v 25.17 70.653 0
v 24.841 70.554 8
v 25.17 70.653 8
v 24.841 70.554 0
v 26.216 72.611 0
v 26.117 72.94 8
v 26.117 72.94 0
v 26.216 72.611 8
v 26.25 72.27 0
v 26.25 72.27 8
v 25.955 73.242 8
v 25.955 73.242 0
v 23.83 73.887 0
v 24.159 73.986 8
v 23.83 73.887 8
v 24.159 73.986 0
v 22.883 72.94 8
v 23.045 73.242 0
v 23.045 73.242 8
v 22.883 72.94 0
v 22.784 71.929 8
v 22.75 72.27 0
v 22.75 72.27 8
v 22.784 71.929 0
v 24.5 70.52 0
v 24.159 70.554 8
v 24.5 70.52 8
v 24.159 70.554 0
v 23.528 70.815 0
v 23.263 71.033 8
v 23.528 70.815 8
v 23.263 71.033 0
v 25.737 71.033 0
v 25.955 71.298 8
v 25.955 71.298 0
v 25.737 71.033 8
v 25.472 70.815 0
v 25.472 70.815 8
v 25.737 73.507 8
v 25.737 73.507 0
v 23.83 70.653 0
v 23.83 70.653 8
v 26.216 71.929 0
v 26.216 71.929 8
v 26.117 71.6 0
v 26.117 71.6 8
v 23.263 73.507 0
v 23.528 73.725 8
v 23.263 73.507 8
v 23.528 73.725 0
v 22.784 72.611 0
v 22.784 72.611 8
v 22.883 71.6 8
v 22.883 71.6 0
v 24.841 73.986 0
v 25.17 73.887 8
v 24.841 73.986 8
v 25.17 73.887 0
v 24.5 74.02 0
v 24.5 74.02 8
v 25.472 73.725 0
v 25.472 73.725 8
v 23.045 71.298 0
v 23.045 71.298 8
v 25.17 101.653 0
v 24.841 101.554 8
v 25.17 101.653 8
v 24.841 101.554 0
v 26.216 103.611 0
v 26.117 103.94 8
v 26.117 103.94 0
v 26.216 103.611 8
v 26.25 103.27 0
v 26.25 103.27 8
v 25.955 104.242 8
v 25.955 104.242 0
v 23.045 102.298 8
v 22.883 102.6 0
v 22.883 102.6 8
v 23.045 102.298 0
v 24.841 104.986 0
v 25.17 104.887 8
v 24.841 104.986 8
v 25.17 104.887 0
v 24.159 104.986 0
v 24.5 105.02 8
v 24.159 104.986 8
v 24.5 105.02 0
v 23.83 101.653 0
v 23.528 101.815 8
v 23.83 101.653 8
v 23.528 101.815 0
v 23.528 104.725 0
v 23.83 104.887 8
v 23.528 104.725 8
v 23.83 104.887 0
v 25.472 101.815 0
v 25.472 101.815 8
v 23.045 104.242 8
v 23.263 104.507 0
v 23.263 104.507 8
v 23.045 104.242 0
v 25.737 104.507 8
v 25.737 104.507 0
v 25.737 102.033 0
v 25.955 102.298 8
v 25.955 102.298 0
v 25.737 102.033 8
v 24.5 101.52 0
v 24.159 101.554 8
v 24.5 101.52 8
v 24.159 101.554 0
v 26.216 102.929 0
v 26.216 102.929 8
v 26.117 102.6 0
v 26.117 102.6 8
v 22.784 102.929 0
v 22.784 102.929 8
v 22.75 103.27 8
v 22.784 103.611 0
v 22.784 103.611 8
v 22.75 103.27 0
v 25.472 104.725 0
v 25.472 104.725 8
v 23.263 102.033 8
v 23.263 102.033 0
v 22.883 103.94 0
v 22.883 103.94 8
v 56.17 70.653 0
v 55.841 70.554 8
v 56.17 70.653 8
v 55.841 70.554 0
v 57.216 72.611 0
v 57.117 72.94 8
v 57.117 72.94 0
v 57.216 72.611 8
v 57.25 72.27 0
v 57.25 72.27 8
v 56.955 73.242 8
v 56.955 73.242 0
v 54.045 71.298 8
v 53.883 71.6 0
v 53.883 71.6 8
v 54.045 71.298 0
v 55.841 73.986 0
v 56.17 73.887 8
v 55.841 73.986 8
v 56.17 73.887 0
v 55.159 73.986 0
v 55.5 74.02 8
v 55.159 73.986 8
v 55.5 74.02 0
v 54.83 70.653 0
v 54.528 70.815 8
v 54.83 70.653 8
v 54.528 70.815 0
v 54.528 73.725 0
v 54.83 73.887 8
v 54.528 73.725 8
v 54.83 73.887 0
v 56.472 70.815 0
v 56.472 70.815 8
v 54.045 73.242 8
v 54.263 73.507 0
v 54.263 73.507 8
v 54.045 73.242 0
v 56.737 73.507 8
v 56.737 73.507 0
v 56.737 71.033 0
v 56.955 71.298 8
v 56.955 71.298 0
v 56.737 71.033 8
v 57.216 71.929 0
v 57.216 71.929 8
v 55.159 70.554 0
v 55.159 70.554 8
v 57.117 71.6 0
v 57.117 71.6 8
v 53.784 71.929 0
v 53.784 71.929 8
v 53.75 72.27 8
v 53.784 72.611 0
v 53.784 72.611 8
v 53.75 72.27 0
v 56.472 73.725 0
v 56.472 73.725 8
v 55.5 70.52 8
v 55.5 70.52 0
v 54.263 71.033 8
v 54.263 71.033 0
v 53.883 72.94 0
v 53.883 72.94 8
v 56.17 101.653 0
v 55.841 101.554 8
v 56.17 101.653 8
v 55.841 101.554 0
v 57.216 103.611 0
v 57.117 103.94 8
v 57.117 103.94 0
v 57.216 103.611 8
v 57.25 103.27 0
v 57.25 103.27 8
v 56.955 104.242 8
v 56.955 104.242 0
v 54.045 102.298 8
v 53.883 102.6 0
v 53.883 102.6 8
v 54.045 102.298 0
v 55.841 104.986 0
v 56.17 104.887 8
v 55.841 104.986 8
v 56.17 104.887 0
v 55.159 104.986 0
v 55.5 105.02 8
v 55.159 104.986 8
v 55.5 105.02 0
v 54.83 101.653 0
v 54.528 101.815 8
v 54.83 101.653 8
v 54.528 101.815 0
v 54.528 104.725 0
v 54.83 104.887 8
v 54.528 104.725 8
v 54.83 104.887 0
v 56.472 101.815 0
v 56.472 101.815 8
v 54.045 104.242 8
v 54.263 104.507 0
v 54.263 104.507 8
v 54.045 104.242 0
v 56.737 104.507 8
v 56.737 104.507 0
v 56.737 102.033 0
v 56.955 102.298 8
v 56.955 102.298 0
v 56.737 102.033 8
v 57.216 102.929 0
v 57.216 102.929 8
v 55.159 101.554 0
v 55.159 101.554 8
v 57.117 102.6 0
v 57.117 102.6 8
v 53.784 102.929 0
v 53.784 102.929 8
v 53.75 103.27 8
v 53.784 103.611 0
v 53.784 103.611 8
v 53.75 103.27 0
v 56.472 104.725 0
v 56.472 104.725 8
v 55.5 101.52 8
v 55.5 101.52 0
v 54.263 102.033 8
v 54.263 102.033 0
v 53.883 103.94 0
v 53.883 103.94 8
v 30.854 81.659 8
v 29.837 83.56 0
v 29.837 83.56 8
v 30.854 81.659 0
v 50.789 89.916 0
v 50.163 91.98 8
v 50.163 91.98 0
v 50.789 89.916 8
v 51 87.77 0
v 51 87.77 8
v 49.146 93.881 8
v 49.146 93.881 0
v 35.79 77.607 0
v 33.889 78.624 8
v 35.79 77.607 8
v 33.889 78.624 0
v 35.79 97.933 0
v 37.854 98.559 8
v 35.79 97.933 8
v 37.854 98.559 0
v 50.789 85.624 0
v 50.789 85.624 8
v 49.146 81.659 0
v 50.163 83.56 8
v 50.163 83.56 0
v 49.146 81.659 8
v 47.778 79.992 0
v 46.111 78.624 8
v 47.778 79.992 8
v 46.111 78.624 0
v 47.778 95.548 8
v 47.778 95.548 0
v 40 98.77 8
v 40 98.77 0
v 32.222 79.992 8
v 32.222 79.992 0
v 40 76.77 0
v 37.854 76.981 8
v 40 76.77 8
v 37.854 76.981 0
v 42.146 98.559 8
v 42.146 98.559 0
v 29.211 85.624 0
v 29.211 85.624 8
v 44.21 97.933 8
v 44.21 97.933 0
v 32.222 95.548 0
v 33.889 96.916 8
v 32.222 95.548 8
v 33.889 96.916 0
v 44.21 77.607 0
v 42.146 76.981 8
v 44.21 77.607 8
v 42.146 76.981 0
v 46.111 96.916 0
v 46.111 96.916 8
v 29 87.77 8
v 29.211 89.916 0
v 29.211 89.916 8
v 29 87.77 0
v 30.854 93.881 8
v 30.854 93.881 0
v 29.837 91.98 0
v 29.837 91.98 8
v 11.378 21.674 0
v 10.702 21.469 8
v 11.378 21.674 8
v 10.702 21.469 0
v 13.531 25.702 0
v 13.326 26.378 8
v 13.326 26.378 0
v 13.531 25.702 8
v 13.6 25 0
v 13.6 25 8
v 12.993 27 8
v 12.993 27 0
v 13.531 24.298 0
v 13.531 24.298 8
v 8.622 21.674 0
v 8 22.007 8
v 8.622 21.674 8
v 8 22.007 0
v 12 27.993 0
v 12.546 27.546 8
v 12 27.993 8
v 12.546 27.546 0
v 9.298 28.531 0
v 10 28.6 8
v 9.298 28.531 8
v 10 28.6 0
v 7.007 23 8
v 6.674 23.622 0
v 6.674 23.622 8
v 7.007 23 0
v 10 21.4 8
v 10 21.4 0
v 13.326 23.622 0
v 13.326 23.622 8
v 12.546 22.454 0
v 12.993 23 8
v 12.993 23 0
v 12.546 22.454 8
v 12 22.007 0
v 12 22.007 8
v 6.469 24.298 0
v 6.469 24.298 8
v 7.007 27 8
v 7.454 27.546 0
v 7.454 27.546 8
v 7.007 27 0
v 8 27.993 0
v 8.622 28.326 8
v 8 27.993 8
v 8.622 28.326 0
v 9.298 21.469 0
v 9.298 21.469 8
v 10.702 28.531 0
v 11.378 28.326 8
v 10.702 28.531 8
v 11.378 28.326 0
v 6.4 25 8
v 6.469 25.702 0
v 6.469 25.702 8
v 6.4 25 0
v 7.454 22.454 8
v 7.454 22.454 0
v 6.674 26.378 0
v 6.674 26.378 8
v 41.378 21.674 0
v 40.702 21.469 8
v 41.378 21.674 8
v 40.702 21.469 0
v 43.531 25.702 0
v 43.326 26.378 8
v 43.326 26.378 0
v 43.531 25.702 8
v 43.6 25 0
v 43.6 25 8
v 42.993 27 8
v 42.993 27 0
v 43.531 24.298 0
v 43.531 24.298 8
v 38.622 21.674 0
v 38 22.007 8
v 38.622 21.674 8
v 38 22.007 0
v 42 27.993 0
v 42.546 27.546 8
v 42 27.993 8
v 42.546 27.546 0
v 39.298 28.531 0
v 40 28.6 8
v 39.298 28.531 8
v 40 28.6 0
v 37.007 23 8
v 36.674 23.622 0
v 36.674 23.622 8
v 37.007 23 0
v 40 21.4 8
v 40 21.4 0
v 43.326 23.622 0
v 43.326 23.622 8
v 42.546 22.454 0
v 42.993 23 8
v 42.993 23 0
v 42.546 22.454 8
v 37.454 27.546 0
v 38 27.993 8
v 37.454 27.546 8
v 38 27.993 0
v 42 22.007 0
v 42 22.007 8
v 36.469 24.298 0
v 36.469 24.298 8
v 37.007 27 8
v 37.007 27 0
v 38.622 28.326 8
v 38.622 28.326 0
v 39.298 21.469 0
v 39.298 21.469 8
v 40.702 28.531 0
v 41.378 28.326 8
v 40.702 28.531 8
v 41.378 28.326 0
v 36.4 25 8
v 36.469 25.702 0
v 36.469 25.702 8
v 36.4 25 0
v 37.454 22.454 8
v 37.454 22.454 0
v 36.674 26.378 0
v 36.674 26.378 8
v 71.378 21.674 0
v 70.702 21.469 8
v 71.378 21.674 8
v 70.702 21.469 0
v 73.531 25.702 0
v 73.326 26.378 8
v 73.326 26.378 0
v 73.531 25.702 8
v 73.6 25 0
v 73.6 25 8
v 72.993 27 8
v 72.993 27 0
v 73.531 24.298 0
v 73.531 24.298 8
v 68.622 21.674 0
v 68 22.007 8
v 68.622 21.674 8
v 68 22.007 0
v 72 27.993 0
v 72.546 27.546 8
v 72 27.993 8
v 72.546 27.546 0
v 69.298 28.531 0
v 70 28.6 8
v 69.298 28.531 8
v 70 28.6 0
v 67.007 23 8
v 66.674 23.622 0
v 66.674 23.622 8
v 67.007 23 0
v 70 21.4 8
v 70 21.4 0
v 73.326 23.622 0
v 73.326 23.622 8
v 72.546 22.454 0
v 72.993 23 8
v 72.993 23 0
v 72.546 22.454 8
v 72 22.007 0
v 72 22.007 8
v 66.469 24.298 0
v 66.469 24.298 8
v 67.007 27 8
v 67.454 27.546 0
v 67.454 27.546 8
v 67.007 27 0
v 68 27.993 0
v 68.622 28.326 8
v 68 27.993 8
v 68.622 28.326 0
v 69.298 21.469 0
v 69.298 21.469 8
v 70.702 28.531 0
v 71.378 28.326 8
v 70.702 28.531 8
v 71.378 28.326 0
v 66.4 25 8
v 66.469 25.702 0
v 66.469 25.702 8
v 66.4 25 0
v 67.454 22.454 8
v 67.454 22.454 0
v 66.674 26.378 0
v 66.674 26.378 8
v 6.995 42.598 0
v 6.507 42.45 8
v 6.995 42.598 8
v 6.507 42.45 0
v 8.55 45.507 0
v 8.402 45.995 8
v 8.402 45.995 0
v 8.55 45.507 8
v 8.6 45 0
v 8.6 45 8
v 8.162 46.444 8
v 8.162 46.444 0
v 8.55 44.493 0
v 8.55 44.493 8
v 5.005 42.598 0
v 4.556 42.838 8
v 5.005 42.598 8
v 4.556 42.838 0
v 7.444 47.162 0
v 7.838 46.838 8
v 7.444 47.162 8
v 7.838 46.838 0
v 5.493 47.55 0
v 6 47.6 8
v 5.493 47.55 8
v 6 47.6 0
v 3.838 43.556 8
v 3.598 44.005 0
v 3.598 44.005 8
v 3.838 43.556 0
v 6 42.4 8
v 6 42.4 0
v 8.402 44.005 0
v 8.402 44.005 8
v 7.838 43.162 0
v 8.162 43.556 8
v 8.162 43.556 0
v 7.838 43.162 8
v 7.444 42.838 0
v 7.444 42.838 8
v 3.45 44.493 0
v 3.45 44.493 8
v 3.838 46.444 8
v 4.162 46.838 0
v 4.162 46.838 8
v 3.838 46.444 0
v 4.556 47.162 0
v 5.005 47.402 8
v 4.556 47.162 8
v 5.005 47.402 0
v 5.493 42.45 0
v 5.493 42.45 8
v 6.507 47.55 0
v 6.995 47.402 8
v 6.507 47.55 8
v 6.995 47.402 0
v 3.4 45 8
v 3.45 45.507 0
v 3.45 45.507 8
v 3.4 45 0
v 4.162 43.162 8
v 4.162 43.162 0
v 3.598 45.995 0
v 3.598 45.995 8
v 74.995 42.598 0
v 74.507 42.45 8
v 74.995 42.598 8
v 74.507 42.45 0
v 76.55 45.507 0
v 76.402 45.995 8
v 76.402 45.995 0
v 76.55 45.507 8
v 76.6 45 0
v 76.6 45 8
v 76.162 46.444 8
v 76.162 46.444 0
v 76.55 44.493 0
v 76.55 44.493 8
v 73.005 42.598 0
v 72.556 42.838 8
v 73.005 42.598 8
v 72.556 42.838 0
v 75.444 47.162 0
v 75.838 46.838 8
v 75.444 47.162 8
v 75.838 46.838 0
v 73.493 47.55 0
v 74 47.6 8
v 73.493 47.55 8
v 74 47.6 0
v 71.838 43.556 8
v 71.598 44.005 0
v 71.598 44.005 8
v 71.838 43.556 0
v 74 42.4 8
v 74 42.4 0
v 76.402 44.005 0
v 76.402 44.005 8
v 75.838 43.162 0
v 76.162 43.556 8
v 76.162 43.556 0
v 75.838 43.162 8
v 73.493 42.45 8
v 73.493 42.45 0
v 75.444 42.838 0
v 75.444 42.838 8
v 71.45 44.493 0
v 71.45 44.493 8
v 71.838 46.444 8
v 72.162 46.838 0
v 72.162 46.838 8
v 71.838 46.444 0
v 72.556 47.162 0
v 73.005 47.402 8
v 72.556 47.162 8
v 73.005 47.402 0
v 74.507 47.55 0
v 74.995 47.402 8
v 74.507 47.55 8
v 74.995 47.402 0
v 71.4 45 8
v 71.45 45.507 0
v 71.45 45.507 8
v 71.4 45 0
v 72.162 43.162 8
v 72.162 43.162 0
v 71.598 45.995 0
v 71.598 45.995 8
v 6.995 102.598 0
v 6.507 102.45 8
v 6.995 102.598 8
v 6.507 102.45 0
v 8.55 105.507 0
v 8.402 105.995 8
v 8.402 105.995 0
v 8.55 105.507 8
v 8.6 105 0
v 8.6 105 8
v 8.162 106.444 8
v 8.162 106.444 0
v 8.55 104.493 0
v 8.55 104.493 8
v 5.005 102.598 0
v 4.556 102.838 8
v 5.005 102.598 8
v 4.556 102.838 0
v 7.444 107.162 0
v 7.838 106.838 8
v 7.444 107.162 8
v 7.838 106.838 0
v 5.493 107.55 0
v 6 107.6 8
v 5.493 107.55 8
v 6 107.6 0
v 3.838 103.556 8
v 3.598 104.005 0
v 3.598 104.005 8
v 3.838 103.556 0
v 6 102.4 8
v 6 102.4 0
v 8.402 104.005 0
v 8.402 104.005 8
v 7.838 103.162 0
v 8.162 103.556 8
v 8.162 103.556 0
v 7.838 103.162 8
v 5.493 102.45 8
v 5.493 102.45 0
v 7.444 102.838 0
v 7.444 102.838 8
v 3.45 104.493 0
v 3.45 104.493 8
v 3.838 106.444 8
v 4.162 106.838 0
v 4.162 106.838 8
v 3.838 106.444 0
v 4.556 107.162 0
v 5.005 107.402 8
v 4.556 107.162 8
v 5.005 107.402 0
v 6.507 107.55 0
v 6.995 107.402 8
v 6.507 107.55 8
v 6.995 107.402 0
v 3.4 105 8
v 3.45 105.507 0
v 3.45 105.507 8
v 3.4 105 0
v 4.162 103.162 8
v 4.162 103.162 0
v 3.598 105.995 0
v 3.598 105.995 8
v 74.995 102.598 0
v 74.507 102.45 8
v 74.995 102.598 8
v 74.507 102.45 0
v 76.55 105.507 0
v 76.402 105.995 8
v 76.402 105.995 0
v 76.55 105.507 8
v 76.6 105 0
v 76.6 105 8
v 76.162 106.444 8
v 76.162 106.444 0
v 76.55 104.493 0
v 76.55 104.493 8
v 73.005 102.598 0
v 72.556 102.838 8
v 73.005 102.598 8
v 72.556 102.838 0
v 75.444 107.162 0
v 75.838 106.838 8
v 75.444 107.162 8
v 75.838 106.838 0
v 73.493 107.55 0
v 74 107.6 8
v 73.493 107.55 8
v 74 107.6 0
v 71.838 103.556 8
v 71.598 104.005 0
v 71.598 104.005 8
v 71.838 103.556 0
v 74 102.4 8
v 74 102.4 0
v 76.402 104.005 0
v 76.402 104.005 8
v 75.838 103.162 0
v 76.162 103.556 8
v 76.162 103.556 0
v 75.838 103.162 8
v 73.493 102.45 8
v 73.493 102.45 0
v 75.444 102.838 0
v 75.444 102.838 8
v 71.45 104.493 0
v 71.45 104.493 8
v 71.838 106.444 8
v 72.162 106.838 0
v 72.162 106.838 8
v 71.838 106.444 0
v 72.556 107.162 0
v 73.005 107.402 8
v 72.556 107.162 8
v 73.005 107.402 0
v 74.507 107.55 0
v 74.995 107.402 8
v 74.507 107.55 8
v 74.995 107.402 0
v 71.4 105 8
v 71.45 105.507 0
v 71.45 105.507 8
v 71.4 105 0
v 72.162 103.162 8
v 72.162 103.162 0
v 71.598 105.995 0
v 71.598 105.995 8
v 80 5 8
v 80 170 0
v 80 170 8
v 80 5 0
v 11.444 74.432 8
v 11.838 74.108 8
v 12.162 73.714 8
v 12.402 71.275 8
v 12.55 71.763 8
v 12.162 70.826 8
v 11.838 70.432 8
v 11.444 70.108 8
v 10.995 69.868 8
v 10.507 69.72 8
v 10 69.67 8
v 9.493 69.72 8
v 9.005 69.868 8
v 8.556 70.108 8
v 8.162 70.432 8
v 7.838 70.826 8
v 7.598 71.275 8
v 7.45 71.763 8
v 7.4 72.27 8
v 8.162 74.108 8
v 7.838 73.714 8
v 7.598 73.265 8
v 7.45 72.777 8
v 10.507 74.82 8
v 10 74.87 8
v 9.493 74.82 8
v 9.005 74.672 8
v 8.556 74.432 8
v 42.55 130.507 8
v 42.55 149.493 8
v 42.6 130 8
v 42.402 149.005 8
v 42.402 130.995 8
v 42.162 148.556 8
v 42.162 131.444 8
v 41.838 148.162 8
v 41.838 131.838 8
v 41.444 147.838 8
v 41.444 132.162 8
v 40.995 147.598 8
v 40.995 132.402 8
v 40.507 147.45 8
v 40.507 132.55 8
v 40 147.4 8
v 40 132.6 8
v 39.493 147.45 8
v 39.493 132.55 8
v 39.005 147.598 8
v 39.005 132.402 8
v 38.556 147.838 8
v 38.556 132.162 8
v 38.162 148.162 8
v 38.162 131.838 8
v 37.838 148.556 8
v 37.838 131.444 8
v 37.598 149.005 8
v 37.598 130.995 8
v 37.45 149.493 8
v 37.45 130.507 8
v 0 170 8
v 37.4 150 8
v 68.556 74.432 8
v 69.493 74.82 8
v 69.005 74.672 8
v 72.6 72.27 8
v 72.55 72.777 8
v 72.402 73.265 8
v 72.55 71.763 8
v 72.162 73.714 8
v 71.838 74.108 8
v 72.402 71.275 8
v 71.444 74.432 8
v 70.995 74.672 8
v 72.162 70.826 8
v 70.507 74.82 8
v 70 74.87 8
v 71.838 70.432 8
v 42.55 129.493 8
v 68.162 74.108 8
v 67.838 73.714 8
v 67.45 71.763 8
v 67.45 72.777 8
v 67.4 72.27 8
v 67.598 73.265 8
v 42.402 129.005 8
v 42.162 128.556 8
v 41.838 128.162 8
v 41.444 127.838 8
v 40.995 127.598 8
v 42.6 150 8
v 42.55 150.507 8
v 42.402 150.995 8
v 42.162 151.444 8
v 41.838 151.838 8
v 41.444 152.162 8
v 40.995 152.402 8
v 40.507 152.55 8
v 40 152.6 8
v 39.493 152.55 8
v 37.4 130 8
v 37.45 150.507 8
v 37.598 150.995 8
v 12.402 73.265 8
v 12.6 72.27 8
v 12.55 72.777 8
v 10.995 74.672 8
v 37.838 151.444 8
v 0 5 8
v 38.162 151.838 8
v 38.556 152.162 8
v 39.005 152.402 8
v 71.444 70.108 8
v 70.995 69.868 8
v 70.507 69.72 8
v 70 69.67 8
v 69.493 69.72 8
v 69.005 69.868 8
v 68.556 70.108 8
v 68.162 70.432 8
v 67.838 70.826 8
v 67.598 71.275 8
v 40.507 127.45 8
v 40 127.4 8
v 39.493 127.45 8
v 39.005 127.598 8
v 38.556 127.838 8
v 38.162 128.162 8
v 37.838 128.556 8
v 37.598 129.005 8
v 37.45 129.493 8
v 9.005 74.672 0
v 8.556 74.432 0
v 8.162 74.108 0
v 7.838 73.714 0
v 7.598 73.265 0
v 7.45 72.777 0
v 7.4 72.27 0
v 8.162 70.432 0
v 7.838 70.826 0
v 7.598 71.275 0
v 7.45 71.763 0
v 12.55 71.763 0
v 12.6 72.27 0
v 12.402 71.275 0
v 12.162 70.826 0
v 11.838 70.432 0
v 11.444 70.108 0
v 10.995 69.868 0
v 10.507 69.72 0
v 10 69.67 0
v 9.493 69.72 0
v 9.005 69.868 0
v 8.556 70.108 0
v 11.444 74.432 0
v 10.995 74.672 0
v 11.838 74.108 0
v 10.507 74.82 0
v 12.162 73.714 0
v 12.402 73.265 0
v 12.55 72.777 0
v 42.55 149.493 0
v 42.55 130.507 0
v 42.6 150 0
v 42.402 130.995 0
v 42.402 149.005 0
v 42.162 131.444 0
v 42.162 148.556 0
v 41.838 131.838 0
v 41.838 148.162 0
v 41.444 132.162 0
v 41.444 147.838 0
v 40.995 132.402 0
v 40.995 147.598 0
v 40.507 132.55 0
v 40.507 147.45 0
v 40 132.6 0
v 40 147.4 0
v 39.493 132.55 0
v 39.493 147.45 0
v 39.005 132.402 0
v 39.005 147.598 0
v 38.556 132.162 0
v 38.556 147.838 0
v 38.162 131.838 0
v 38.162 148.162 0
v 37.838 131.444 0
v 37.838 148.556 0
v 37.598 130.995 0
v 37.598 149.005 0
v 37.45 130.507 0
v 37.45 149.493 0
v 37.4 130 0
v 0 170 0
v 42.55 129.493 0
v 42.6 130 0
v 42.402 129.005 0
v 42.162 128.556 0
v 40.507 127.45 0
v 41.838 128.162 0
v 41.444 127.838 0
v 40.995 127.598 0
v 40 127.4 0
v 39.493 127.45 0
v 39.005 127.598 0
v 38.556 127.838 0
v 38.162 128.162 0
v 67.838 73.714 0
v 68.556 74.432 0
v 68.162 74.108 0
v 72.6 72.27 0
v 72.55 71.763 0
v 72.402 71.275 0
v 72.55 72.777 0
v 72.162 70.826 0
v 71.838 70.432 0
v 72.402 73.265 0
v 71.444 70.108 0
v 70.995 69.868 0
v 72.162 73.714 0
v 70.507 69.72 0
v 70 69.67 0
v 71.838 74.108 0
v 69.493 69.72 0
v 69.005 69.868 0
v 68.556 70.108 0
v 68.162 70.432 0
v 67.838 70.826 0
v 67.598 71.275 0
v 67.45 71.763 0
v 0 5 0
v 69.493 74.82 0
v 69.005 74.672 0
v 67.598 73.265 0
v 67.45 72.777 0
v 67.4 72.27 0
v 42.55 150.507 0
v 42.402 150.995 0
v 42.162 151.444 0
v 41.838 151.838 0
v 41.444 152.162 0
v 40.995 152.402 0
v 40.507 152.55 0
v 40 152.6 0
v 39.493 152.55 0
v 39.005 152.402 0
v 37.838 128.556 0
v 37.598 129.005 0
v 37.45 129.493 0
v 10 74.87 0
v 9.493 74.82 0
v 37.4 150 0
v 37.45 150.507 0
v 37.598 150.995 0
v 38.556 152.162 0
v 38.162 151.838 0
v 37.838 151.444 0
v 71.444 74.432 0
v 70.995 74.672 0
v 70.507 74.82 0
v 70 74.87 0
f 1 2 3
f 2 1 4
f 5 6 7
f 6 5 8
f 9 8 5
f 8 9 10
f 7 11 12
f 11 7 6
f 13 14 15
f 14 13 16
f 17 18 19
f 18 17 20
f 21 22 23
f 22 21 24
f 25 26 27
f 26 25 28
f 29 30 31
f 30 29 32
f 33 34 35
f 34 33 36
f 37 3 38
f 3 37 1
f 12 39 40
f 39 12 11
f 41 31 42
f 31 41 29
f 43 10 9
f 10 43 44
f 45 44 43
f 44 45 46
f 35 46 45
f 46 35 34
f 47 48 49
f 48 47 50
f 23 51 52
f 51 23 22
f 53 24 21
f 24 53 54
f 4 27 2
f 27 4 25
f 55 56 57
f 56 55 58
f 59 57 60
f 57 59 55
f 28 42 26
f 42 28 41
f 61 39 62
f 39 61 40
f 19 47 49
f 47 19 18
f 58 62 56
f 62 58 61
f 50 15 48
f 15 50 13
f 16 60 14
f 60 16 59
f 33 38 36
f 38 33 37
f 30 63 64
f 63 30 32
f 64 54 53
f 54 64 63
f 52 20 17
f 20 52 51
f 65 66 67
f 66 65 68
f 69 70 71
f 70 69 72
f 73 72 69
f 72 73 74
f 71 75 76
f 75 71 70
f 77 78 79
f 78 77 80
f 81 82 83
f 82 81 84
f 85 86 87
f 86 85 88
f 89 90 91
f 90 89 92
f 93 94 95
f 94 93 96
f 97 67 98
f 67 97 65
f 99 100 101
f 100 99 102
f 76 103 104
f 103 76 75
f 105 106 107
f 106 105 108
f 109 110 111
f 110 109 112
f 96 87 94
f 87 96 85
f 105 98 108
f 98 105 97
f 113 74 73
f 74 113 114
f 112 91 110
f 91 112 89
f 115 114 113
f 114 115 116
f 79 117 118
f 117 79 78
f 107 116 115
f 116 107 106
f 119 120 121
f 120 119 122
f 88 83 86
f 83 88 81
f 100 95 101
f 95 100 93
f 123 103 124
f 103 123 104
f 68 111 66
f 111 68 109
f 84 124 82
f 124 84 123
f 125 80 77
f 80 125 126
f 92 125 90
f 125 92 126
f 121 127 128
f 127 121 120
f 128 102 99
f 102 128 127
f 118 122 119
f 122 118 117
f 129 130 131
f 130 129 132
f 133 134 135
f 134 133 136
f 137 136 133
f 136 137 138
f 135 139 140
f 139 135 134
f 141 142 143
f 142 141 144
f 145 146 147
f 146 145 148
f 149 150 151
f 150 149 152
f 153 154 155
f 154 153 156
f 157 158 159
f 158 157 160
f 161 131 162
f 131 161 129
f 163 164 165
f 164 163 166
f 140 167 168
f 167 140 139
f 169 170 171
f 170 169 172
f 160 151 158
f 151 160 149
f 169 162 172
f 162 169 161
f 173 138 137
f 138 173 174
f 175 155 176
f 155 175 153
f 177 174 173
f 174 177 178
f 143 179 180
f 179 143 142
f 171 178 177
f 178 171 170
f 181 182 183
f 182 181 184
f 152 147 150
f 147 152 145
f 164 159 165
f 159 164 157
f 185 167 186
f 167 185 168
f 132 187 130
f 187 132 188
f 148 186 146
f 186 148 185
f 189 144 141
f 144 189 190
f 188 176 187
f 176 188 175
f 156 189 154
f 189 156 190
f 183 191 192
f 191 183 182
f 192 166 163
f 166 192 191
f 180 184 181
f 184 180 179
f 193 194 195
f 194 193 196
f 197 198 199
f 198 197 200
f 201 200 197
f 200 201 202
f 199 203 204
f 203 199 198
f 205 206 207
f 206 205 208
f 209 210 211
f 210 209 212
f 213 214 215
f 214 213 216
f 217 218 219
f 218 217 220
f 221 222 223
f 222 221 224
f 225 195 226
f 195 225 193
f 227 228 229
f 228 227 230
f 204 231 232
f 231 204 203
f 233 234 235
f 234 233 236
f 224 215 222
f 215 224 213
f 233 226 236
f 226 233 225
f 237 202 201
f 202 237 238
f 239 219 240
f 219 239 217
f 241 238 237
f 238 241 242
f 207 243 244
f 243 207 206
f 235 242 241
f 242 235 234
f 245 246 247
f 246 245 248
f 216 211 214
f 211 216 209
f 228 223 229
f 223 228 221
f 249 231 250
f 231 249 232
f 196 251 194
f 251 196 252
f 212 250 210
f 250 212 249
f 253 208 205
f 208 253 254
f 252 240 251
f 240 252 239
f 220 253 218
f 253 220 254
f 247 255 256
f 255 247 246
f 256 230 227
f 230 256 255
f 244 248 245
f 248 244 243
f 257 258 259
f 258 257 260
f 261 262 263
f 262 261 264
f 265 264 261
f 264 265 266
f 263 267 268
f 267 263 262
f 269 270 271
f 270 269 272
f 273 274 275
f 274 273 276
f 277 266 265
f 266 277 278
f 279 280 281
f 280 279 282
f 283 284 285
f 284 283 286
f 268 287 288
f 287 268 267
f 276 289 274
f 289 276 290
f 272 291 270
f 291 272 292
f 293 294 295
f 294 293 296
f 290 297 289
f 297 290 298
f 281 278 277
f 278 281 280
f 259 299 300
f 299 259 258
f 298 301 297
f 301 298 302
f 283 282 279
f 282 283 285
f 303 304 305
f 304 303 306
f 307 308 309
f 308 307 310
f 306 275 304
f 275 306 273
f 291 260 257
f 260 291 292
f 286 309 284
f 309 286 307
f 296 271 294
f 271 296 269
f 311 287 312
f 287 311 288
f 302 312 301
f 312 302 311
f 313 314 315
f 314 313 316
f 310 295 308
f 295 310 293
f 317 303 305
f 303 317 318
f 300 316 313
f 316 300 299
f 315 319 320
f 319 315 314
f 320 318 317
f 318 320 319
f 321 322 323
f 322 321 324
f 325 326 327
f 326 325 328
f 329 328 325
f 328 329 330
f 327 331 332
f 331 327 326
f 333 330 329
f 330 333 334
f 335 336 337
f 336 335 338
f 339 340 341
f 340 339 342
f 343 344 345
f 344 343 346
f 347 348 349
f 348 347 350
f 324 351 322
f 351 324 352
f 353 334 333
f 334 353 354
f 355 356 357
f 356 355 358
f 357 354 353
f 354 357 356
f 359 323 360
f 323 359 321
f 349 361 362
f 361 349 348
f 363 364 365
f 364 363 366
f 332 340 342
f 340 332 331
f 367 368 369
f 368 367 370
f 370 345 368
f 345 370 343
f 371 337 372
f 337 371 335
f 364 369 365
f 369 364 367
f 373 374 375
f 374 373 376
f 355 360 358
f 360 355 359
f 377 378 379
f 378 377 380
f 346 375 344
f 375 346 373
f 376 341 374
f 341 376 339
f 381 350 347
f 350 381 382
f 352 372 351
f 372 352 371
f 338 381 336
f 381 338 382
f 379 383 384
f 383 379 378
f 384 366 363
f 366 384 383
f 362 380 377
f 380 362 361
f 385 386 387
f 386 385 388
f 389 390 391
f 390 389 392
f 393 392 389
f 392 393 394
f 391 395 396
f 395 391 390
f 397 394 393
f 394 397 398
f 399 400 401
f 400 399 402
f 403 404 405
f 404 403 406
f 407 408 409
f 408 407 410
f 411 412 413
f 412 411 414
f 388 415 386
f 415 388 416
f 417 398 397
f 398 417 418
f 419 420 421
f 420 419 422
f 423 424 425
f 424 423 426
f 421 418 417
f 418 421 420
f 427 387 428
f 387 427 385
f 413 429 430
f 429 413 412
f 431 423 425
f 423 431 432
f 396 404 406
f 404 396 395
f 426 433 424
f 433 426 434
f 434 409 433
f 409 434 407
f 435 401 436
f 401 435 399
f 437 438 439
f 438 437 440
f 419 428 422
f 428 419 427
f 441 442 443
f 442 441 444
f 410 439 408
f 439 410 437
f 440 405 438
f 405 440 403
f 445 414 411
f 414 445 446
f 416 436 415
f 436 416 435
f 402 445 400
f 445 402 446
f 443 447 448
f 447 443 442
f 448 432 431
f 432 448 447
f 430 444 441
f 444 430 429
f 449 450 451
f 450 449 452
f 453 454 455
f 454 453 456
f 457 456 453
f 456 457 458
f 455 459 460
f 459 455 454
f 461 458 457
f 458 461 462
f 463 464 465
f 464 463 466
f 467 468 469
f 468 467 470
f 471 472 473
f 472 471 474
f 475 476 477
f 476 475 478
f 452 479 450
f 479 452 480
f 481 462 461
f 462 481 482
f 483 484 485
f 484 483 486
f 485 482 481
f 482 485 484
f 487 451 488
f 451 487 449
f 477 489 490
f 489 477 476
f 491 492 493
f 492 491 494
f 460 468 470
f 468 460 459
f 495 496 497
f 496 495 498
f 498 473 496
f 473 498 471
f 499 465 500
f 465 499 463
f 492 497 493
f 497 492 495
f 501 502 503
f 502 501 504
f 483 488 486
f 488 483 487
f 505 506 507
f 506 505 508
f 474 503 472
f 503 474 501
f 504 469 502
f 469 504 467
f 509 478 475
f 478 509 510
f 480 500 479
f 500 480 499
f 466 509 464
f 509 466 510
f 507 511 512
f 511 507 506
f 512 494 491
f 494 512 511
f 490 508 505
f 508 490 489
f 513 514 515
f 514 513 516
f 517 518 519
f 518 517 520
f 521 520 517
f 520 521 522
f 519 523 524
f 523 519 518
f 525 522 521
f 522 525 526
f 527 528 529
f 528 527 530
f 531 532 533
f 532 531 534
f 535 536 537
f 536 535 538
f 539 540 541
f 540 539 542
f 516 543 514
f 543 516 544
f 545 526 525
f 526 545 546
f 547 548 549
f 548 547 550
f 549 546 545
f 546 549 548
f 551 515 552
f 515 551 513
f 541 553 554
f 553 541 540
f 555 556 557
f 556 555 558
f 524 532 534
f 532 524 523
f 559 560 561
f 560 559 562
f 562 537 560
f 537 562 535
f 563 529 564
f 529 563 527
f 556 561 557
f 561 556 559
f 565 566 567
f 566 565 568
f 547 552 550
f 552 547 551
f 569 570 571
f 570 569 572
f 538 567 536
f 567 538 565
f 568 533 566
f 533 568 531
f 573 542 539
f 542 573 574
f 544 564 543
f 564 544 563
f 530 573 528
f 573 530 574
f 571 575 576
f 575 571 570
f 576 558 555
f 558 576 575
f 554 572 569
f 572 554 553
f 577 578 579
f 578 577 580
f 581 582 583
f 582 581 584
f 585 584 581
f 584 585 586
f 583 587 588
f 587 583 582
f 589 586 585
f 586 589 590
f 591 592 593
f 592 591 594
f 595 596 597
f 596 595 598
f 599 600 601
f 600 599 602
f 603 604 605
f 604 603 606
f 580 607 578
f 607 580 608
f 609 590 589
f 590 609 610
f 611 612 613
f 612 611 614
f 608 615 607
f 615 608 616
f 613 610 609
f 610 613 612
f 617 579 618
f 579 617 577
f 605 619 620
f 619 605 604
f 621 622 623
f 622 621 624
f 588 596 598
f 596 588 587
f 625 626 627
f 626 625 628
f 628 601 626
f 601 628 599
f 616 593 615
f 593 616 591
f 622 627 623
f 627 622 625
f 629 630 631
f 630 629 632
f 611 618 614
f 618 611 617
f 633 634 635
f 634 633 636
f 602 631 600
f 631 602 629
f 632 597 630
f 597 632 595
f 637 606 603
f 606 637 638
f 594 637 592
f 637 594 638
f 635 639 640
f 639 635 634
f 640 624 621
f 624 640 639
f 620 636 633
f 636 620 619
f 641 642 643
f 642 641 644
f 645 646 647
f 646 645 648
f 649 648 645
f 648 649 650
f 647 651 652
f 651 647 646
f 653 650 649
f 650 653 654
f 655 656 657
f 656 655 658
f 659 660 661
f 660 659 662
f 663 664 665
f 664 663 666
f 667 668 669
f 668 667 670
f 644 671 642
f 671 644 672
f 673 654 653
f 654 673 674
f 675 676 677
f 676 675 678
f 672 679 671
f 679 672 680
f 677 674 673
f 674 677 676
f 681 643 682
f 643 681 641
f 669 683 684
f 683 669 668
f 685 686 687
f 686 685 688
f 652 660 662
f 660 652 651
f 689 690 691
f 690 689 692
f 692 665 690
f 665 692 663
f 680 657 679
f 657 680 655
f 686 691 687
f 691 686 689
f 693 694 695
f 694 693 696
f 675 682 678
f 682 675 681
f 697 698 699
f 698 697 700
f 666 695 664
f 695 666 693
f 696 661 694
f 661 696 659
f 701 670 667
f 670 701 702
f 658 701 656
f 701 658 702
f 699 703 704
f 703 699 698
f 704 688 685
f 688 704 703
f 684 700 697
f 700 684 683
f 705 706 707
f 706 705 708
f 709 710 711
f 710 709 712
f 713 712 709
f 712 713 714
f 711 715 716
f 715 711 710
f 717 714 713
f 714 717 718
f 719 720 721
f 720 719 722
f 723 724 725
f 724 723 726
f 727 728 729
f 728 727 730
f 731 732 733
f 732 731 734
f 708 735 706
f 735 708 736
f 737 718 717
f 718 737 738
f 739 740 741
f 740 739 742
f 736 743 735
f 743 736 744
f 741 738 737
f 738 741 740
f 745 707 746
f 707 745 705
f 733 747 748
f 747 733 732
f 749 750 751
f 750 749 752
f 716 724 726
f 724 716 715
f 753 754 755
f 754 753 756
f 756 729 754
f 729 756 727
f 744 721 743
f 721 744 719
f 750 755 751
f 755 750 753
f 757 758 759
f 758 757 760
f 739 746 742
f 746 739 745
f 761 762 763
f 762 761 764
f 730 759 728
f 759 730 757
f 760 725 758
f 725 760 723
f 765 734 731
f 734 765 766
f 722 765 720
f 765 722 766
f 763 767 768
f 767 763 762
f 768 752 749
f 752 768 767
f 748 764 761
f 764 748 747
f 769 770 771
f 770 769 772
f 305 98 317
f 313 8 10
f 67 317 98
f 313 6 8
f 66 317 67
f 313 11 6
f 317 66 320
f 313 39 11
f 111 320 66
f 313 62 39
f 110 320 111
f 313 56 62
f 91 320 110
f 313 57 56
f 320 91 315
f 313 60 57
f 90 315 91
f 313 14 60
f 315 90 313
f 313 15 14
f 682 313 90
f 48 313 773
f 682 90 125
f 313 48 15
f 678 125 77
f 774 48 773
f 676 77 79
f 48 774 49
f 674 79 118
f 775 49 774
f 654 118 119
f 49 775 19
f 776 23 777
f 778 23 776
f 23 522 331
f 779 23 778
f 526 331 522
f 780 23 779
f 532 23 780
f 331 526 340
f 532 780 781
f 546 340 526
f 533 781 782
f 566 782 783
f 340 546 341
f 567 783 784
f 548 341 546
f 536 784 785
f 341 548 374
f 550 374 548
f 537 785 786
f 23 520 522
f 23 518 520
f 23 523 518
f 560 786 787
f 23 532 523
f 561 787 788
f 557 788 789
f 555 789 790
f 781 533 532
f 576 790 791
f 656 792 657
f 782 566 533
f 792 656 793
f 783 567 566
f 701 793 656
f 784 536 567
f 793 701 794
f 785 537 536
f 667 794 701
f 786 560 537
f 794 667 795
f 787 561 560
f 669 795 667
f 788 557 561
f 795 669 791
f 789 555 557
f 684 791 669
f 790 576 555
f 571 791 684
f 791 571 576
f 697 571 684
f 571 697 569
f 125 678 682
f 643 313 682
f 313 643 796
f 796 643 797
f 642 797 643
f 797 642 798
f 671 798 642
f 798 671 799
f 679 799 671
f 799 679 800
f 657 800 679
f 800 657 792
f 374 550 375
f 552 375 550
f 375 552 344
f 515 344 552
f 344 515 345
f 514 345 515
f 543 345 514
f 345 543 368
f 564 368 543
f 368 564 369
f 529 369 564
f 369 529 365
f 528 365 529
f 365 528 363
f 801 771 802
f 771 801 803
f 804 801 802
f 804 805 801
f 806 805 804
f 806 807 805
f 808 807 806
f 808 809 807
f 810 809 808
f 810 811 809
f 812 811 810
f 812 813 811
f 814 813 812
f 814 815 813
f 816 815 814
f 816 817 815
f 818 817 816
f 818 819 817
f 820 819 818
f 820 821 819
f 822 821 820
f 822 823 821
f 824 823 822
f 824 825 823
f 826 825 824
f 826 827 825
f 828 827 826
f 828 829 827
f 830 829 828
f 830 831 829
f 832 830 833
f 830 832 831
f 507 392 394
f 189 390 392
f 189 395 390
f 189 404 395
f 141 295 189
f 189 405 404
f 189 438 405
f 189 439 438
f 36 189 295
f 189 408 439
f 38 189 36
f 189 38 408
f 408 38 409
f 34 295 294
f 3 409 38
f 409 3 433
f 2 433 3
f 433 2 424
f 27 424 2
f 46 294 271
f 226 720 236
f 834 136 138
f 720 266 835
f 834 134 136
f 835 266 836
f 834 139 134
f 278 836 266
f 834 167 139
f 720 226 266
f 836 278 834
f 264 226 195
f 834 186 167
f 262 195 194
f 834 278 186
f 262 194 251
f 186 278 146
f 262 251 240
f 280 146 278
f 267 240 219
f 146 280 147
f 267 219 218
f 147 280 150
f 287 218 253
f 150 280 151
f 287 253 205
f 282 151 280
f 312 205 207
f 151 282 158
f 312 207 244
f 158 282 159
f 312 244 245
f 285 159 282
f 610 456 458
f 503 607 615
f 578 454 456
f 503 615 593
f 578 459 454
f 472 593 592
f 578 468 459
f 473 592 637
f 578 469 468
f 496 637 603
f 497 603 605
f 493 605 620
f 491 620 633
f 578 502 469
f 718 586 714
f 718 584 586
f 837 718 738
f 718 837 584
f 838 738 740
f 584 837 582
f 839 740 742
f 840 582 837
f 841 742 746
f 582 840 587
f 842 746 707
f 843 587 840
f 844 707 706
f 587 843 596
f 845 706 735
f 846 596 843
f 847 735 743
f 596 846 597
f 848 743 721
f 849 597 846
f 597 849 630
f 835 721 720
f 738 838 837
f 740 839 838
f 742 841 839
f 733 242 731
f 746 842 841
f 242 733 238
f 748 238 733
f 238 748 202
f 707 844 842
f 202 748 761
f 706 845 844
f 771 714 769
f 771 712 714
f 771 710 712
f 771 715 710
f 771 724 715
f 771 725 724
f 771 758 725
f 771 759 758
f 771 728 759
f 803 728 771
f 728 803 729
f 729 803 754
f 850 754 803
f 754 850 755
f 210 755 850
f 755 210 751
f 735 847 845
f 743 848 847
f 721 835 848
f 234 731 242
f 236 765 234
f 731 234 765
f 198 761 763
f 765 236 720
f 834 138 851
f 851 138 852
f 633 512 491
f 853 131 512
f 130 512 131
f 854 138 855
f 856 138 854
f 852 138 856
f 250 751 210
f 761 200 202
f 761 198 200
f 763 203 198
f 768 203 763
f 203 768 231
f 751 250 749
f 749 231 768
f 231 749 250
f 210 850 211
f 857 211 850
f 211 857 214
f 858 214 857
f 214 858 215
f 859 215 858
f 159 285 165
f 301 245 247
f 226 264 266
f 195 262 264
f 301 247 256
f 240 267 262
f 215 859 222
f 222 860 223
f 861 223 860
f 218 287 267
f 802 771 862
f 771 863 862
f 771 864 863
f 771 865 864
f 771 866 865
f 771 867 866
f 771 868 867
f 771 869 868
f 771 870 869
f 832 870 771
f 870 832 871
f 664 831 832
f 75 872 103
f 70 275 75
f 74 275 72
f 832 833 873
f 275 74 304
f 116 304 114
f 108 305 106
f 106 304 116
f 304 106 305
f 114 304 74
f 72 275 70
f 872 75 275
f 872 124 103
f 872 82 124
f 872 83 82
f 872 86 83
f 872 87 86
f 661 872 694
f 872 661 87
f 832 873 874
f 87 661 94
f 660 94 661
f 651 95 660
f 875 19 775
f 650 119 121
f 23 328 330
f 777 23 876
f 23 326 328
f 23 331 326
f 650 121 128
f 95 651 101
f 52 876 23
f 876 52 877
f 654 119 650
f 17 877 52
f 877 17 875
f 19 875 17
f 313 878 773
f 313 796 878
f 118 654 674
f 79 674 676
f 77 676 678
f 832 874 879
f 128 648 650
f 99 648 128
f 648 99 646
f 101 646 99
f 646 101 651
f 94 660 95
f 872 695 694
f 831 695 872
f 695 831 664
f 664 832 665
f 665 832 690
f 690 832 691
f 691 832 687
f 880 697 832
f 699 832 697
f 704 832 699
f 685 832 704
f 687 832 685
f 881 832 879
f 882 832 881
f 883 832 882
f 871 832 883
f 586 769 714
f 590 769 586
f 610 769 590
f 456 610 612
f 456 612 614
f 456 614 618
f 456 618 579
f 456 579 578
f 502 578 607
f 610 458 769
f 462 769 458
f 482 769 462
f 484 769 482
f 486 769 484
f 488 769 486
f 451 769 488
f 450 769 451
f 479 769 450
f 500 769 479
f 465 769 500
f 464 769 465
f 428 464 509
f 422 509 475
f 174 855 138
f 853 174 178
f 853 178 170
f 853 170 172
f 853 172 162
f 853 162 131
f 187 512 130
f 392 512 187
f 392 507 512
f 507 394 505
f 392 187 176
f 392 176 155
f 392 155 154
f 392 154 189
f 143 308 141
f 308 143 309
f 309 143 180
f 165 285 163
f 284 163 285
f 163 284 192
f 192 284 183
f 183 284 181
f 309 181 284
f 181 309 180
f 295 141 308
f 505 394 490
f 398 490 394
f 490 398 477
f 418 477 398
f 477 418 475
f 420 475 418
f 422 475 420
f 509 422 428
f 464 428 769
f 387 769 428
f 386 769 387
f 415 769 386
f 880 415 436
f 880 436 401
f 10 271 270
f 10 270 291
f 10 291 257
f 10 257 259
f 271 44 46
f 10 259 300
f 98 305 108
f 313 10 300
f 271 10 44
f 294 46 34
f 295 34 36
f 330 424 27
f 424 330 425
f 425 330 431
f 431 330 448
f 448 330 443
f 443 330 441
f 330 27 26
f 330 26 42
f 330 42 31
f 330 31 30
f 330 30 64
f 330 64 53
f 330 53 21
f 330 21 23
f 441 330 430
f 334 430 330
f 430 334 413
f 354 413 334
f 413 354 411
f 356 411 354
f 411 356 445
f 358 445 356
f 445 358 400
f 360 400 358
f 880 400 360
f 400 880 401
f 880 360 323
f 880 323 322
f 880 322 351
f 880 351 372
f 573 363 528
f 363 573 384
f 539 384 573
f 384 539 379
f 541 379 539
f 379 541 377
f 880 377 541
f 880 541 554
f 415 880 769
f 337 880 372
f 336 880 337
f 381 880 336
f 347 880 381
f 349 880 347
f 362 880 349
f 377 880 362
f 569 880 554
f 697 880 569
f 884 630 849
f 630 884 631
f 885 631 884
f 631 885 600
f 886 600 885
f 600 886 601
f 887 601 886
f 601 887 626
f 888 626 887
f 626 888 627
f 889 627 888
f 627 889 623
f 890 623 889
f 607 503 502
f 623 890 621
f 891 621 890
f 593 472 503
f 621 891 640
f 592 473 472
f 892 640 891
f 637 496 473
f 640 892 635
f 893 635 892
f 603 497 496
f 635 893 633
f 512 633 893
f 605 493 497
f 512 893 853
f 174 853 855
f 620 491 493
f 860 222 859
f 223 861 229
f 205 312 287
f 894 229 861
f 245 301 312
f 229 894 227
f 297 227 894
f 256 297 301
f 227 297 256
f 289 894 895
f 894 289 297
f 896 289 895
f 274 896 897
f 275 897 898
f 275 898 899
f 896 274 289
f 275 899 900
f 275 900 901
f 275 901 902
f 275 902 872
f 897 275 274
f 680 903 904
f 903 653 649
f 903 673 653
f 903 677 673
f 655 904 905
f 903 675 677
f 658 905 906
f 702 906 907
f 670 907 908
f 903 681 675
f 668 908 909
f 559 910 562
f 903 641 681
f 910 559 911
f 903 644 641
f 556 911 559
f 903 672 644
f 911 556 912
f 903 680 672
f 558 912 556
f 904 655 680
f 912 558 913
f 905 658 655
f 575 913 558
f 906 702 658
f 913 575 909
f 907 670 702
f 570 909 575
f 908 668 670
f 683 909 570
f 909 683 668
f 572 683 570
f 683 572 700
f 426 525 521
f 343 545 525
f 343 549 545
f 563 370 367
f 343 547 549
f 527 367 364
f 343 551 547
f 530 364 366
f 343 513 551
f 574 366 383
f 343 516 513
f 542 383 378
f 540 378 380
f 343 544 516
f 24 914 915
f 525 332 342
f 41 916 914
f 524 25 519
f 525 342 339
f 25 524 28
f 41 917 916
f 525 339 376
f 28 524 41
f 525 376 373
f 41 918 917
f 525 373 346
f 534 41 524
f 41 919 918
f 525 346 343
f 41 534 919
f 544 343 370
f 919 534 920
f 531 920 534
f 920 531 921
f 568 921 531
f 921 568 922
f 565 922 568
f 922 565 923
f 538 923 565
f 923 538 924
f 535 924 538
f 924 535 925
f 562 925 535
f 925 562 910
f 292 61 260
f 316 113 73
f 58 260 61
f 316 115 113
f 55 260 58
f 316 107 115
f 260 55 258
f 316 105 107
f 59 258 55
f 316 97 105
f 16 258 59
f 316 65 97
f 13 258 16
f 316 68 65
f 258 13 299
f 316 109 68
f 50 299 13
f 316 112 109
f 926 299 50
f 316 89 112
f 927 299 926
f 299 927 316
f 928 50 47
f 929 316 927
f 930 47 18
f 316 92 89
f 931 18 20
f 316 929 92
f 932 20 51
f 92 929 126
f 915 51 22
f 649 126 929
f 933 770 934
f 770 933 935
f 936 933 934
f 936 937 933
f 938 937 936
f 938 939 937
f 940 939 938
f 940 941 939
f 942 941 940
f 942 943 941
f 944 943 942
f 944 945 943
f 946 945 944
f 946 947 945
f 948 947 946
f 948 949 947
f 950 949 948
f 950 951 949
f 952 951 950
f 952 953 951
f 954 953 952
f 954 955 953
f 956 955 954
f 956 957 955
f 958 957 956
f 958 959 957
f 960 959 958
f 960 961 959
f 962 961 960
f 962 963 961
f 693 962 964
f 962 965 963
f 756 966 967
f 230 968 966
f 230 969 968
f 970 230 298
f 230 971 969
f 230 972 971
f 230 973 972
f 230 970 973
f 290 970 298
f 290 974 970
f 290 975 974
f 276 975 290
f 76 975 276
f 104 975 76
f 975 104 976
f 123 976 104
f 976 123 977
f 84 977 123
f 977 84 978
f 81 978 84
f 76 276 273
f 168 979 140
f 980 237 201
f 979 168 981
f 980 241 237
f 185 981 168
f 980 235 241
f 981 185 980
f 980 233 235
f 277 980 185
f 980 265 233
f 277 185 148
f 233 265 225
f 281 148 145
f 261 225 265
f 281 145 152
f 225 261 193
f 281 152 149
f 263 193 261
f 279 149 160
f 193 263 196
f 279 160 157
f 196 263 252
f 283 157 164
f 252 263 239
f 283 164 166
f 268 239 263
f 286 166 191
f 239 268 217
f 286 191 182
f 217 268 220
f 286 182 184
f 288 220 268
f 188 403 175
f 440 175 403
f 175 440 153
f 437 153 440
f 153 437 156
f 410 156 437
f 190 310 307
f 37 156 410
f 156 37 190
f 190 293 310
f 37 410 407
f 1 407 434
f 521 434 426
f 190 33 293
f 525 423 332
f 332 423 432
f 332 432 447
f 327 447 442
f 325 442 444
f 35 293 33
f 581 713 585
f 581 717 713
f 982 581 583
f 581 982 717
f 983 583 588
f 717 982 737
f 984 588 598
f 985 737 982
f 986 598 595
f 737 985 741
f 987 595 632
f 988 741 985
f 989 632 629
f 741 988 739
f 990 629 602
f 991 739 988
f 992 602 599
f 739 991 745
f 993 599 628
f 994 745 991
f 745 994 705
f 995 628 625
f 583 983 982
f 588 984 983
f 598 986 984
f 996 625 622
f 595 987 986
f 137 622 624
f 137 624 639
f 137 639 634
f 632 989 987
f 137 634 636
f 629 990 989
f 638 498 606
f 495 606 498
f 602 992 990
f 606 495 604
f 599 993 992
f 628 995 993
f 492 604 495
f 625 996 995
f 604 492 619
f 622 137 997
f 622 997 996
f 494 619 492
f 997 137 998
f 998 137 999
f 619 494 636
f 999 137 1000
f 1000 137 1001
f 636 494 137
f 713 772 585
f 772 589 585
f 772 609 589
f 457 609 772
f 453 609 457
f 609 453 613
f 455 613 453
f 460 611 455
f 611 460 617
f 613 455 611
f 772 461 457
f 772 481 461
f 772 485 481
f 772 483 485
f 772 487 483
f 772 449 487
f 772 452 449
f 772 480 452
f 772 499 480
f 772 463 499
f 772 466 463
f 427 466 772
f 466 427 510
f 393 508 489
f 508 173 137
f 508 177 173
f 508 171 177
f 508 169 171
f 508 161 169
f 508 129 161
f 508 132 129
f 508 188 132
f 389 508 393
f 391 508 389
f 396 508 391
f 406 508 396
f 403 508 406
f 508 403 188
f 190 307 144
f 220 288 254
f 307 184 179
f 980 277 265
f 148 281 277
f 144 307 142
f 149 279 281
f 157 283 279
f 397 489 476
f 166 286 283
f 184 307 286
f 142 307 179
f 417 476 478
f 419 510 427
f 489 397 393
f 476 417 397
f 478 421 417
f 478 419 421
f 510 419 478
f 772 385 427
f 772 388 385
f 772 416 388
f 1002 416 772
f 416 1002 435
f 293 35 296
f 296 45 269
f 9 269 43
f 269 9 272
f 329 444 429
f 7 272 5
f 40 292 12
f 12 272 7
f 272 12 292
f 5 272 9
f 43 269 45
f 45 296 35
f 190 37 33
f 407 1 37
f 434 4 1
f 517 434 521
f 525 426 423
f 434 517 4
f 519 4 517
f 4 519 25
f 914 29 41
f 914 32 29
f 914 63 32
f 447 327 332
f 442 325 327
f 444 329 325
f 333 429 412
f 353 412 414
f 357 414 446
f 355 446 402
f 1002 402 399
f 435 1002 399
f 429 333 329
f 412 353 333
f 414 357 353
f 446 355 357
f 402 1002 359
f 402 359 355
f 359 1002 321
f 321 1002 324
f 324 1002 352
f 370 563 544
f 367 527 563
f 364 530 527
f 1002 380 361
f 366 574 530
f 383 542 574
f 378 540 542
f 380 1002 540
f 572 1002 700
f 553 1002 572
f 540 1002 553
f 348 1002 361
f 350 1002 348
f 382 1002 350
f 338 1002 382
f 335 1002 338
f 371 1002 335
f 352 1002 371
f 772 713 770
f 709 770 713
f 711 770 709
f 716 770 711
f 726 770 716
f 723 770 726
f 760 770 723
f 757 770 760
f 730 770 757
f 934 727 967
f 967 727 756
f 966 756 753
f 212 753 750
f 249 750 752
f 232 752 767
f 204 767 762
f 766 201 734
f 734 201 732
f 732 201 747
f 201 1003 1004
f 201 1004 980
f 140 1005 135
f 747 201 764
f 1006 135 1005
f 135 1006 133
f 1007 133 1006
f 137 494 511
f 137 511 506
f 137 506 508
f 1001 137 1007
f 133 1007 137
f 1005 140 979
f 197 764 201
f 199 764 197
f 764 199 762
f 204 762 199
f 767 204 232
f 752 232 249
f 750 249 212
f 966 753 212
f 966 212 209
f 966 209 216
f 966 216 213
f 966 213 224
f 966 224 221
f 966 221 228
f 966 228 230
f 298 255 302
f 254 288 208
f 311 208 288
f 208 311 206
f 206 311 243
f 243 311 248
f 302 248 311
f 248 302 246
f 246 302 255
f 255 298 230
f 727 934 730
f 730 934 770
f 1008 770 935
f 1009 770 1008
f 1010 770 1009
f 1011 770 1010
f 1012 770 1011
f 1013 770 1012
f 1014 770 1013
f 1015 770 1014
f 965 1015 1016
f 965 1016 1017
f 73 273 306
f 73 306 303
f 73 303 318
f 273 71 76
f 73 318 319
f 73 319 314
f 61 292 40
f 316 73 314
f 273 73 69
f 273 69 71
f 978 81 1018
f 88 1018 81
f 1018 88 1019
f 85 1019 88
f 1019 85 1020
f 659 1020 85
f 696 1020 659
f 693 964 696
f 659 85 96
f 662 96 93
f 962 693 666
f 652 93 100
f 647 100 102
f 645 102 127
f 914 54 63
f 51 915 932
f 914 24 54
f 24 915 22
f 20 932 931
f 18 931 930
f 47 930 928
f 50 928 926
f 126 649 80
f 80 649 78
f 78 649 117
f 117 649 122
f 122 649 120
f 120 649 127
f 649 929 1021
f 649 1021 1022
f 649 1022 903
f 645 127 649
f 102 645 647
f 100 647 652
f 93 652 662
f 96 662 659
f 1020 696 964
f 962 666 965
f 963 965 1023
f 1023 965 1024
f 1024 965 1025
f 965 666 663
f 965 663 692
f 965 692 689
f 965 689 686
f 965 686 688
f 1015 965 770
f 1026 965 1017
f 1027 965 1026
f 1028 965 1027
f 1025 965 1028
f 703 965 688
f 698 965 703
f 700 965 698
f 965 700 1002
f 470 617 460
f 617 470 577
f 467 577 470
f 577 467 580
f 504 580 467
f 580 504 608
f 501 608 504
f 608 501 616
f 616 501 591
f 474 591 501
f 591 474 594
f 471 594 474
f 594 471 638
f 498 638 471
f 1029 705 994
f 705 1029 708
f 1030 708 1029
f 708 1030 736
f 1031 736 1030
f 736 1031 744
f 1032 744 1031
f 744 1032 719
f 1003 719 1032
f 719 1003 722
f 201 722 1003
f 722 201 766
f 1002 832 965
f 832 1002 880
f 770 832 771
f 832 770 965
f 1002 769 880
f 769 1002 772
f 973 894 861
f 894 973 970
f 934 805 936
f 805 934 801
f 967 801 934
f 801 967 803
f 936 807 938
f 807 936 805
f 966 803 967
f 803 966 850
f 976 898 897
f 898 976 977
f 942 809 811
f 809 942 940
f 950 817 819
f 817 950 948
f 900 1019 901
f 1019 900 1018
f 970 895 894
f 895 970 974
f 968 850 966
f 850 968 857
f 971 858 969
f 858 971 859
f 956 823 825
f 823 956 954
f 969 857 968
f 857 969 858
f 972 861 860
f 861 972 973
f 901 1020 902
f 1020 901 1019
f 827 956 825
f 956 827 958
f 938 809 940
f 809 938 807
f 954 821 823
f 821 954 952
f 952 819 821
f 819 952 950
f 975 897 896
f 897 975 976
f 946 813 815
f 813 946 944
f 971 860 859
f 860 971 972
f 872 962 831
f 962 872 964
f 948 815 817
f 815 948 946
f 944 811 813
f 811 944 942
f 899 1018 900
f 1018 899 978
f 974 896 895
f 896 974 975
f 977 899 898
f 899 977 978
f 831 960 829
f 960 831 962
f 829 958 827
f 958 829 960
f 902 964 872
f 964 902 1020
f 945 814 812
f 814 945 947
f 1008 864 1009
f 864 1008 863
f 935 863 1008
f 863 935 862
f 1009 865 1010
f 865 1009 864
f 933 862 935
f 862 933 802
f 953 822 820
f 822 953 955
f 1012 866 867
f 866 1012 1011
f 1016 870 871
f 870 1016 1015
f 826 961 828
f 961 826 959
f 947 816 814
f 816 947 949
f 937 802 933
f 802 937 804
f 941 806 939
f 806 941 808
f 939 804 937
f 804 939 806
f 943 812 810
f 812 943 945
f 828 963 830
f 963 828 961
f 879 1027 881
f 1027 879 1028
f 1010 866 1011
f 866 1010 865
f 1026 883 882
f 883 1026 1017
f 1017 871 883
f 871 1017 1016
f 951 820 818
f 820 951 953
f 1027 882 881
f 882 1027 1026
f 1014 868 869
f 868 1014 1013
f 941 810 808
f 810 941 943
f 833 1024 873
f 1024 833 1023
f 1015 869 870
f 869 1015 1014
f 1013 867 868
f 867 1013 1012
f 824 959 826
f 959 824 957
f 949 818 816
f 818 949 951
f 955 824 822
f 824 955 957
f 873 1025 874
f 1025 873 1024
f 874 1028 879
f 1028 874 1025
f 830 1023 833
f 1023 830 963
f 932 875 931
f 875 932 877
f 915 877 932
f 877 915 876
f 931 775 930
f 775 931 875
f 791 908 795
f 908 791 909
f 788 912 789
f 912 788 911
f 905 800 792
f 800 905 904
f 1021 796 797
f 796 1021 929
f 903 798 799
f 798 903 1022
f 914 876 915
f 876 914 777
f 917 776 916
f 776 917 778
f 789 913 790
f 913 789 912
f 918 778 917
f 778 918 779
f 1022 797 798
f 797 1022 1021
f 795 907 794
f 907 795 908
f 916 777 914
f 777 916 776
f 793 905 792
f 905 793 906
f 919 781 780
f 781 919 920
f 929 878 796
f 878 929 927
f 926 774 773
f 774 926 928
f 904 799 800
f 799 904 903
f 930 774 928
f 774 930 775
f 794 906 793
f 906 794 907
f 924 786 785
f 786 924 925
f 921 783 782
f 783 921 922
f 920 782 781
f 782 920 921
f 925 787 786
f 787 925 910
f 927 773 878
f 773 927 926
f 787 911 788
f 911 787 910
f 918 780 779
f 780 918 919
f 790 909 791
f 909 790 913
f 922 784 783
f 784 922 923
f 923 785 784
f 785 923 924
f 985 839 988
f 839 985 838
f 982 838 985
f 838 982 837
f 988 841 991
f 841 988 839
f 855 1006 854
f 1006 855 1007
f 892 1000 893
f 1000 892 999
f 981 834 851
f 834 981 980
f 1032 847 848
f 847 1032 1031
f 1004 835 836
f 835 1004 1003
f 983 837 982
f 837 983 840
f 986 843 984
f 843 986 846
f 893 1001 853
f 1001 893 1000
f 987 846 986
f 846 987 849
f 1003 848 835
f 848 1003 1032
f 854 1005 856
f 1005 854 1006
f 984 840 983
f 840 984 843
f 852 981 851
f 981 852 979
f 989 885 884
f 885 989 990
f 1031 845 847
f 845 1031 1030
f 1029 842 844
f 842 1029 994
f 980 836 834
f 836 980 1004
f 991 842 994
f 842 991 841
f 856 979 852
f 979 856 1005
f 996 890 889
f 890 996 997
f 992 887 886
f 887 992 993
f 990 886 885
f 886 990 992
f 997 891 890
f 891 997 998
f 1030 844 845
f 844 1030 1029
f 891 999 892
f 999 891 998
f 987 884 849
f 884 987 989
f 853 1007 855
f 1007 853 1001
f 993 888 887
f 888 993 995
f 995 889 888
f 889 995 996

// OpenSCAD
// SUPERSEDED 2026-07-29: switched to laser-cut 5mm black acrylic instead
// of 3D-printed PLA-CF (see ADR 0047 and hardware/laser-cut/y-gantry-plate.svg,
// the actual current design file). Kept here for reference/coordinate
// history only, not built.
//
// Y-axis gantry plate: reuses wheel/wheel-bolt hardware from the purchased
// aluminum V-wheel plate kit (0040), captured-belt drive (0046 -> reverted,
// this file supersedes that reversion). Two variants: motor side and
// bearing side, both share the same wheel/2040/L-bracket layout, differing
// only in the center mount (NEMA17 vs 625ZZ bearing).
//
// Reference geometry extracted from Printables/yplateleft.stl and
// yplateright.stl (both 80x160x8mm):
//   - 2040 mount: 2x M5 clearance, (40,130) & (40,150), 20mm apart on
//     centerline, matches this project's standard T-slot spacing
//   - NEMA17 / bearing center: (40, 87.77) -- NEMA17 is 4x M3 clearance
//     on a 31x31mm square around a 22mm shaft-clearance bore; bearing is
//     a single 16.2mm bore for the 625ZZ (matches
//     shaft-far-end-bearing-mount.scad's own bore sizing)
//   - Top wheels (yellow, reference): (10,72.27) & (70,72.27), Ø5.2mm,
//     fixed (non-eccentric) mounting, flanking the shaft
//   - Bottom wheel (grey, reference): (40,12.27), Ø7.2mm -- wider to
//     clear the eccentric tension-adjustment nut, matches the purchased
//     aluminum plate's own Ø7.2mm wheel-hole spec
//
// THIS design: 2 top wheels (unchanged from reference) + 3 BOTTOM wheels
// (reference only has 1) -- plate extended/widened at the bottom to fit
// 3 wheels in a row, all using the wider eccentric-nut-clearance hole
// style since all 3 bear the load. Plus 4 new M5 holes for L-brackets
// (2 per long edge), per the "FOR 20 SERIES ALUMINUM PROFILE RAIL"
// corner bracket (26mm tall leg, 25mm long leg, M5, hole 6mm in from
// the bend) -- NOT YET VERIFIED against the physical bracket, working
// estimate for hole position only (M5 clearance, doesn't need to match
// the bracket's own dimensions beyond bolt size).
//
// Print settings: PLA-CF, 100% (solid) infill -- same rationale as the
// idler mount (0018) and bearing mount: constantly-loaded points.

// ---- Variant switch ----
variant = "motor"; // "motor" or "bearing"

// ---- Parameters ----
plate_w = 80;
plate_t = 8;
plate_top_margin = 20;   // above the 2040 holes
plate_bottom_margin = 20; // below the bottom wheel row

hole_2040_y1 = 130;
hole_2040_y2 = 150;
hole_2040_d = 5.2;
hole_2040_x = plate_w/2;

center_y = 87.77;          // NEMA17 / bearing center, unchanged from reference
nema_bolt_spacing = 31;    // standard NEMA17 31x31mm
nema_bolt_d = 3.5;
nema_bore_d = 22;
bearing_bore_d = 16.2;

top_wheel_y = 72.27;       // unchanged from reference
top_wheel_x_offset = 30;   // +-30 from centerline (10 and 70 on an 80-wide plate)
top_wheel_d = 5.2;

bottom_wheel_y = 25;       // working estimate -- room for a 3-wheel row + margin
bottom_wheel_spacing = 30; // 3 wheels across the 80mm width, evenly spaced
bottom_wheel_d = 7.2;      // matches the purchased plate's own wheel-hole spec, eccentric-nut clearance

lbracket_hole_d = 5.2;     // M5 clearance
lbracket_x_offset = 6;     // inset from each edge
lbracket_y_positions = [45, 105]; // 2 per side, spread along the plate's mid-height

plate_h = hole_2040_y2 + plate_top_margin;
plate_bottom_y = bottom_wheel_y - plate_bottom_margin; // bottom edge, margin below the wheel row

module hole(x, y, d) {
    translate([x, y, -1])
        cylinder(d = d, h = plate_t + 2, $fn = 32);
}

module plate_outline() {
    translate([0, plate_bottom_y, 0])
        cube([plate_w, plate_h - plate_bottom_y, plate_t]);
}

difference() {
    plate_outline();

    // 2040 mount
    hole(hole_2040_x, hole_2040_y1, hole_2040_d);
    hole(hole_2040_x, hole_2040_y2, hole_2040_d);

    // NEMA17 or bearing
    if (variant == "motor") {
        hole(plate_w/2, center_y, nema_bore_d);
        for (dx = [-nema_bolt_spacing/2, nema_bolt_spacing/2])
            for (dy = [-nema_bolt_spacing/2, nema_bolt_spacing/2])
                hole(plate_w/2 + dx, center_y + dy, nema_bolt_d);
    } else {
        hole(plate_w/2, center_y, bearing_bore_d);
    }

    // top wheels (2, flanking the shaft)
    hole(plate_w/2 - top_wheel_x_offset, top_wheel_y, top_wheel_d);
    hole(plate_w/2 + top_wheel_x_offset, top_wheel_y, top_wheel_d);

    // bottom wheels (3, in a row)
    for (dx = [-bottom_wheel_spacing, 0, bottom_wheel_spacing])
        hole(plate_w/2 + dx, bottom_wheel_y, bottom_wheel_d);

    // 4 L-bracket holes, 2 per long edge
    for (y = lbracket_y_positions) {
        hole(lbracket_x_offset, y, lbracket_hole_d);
        hole(plate_w - lbracket_x_offset, y, lbracket_hole_d);
    }
}
